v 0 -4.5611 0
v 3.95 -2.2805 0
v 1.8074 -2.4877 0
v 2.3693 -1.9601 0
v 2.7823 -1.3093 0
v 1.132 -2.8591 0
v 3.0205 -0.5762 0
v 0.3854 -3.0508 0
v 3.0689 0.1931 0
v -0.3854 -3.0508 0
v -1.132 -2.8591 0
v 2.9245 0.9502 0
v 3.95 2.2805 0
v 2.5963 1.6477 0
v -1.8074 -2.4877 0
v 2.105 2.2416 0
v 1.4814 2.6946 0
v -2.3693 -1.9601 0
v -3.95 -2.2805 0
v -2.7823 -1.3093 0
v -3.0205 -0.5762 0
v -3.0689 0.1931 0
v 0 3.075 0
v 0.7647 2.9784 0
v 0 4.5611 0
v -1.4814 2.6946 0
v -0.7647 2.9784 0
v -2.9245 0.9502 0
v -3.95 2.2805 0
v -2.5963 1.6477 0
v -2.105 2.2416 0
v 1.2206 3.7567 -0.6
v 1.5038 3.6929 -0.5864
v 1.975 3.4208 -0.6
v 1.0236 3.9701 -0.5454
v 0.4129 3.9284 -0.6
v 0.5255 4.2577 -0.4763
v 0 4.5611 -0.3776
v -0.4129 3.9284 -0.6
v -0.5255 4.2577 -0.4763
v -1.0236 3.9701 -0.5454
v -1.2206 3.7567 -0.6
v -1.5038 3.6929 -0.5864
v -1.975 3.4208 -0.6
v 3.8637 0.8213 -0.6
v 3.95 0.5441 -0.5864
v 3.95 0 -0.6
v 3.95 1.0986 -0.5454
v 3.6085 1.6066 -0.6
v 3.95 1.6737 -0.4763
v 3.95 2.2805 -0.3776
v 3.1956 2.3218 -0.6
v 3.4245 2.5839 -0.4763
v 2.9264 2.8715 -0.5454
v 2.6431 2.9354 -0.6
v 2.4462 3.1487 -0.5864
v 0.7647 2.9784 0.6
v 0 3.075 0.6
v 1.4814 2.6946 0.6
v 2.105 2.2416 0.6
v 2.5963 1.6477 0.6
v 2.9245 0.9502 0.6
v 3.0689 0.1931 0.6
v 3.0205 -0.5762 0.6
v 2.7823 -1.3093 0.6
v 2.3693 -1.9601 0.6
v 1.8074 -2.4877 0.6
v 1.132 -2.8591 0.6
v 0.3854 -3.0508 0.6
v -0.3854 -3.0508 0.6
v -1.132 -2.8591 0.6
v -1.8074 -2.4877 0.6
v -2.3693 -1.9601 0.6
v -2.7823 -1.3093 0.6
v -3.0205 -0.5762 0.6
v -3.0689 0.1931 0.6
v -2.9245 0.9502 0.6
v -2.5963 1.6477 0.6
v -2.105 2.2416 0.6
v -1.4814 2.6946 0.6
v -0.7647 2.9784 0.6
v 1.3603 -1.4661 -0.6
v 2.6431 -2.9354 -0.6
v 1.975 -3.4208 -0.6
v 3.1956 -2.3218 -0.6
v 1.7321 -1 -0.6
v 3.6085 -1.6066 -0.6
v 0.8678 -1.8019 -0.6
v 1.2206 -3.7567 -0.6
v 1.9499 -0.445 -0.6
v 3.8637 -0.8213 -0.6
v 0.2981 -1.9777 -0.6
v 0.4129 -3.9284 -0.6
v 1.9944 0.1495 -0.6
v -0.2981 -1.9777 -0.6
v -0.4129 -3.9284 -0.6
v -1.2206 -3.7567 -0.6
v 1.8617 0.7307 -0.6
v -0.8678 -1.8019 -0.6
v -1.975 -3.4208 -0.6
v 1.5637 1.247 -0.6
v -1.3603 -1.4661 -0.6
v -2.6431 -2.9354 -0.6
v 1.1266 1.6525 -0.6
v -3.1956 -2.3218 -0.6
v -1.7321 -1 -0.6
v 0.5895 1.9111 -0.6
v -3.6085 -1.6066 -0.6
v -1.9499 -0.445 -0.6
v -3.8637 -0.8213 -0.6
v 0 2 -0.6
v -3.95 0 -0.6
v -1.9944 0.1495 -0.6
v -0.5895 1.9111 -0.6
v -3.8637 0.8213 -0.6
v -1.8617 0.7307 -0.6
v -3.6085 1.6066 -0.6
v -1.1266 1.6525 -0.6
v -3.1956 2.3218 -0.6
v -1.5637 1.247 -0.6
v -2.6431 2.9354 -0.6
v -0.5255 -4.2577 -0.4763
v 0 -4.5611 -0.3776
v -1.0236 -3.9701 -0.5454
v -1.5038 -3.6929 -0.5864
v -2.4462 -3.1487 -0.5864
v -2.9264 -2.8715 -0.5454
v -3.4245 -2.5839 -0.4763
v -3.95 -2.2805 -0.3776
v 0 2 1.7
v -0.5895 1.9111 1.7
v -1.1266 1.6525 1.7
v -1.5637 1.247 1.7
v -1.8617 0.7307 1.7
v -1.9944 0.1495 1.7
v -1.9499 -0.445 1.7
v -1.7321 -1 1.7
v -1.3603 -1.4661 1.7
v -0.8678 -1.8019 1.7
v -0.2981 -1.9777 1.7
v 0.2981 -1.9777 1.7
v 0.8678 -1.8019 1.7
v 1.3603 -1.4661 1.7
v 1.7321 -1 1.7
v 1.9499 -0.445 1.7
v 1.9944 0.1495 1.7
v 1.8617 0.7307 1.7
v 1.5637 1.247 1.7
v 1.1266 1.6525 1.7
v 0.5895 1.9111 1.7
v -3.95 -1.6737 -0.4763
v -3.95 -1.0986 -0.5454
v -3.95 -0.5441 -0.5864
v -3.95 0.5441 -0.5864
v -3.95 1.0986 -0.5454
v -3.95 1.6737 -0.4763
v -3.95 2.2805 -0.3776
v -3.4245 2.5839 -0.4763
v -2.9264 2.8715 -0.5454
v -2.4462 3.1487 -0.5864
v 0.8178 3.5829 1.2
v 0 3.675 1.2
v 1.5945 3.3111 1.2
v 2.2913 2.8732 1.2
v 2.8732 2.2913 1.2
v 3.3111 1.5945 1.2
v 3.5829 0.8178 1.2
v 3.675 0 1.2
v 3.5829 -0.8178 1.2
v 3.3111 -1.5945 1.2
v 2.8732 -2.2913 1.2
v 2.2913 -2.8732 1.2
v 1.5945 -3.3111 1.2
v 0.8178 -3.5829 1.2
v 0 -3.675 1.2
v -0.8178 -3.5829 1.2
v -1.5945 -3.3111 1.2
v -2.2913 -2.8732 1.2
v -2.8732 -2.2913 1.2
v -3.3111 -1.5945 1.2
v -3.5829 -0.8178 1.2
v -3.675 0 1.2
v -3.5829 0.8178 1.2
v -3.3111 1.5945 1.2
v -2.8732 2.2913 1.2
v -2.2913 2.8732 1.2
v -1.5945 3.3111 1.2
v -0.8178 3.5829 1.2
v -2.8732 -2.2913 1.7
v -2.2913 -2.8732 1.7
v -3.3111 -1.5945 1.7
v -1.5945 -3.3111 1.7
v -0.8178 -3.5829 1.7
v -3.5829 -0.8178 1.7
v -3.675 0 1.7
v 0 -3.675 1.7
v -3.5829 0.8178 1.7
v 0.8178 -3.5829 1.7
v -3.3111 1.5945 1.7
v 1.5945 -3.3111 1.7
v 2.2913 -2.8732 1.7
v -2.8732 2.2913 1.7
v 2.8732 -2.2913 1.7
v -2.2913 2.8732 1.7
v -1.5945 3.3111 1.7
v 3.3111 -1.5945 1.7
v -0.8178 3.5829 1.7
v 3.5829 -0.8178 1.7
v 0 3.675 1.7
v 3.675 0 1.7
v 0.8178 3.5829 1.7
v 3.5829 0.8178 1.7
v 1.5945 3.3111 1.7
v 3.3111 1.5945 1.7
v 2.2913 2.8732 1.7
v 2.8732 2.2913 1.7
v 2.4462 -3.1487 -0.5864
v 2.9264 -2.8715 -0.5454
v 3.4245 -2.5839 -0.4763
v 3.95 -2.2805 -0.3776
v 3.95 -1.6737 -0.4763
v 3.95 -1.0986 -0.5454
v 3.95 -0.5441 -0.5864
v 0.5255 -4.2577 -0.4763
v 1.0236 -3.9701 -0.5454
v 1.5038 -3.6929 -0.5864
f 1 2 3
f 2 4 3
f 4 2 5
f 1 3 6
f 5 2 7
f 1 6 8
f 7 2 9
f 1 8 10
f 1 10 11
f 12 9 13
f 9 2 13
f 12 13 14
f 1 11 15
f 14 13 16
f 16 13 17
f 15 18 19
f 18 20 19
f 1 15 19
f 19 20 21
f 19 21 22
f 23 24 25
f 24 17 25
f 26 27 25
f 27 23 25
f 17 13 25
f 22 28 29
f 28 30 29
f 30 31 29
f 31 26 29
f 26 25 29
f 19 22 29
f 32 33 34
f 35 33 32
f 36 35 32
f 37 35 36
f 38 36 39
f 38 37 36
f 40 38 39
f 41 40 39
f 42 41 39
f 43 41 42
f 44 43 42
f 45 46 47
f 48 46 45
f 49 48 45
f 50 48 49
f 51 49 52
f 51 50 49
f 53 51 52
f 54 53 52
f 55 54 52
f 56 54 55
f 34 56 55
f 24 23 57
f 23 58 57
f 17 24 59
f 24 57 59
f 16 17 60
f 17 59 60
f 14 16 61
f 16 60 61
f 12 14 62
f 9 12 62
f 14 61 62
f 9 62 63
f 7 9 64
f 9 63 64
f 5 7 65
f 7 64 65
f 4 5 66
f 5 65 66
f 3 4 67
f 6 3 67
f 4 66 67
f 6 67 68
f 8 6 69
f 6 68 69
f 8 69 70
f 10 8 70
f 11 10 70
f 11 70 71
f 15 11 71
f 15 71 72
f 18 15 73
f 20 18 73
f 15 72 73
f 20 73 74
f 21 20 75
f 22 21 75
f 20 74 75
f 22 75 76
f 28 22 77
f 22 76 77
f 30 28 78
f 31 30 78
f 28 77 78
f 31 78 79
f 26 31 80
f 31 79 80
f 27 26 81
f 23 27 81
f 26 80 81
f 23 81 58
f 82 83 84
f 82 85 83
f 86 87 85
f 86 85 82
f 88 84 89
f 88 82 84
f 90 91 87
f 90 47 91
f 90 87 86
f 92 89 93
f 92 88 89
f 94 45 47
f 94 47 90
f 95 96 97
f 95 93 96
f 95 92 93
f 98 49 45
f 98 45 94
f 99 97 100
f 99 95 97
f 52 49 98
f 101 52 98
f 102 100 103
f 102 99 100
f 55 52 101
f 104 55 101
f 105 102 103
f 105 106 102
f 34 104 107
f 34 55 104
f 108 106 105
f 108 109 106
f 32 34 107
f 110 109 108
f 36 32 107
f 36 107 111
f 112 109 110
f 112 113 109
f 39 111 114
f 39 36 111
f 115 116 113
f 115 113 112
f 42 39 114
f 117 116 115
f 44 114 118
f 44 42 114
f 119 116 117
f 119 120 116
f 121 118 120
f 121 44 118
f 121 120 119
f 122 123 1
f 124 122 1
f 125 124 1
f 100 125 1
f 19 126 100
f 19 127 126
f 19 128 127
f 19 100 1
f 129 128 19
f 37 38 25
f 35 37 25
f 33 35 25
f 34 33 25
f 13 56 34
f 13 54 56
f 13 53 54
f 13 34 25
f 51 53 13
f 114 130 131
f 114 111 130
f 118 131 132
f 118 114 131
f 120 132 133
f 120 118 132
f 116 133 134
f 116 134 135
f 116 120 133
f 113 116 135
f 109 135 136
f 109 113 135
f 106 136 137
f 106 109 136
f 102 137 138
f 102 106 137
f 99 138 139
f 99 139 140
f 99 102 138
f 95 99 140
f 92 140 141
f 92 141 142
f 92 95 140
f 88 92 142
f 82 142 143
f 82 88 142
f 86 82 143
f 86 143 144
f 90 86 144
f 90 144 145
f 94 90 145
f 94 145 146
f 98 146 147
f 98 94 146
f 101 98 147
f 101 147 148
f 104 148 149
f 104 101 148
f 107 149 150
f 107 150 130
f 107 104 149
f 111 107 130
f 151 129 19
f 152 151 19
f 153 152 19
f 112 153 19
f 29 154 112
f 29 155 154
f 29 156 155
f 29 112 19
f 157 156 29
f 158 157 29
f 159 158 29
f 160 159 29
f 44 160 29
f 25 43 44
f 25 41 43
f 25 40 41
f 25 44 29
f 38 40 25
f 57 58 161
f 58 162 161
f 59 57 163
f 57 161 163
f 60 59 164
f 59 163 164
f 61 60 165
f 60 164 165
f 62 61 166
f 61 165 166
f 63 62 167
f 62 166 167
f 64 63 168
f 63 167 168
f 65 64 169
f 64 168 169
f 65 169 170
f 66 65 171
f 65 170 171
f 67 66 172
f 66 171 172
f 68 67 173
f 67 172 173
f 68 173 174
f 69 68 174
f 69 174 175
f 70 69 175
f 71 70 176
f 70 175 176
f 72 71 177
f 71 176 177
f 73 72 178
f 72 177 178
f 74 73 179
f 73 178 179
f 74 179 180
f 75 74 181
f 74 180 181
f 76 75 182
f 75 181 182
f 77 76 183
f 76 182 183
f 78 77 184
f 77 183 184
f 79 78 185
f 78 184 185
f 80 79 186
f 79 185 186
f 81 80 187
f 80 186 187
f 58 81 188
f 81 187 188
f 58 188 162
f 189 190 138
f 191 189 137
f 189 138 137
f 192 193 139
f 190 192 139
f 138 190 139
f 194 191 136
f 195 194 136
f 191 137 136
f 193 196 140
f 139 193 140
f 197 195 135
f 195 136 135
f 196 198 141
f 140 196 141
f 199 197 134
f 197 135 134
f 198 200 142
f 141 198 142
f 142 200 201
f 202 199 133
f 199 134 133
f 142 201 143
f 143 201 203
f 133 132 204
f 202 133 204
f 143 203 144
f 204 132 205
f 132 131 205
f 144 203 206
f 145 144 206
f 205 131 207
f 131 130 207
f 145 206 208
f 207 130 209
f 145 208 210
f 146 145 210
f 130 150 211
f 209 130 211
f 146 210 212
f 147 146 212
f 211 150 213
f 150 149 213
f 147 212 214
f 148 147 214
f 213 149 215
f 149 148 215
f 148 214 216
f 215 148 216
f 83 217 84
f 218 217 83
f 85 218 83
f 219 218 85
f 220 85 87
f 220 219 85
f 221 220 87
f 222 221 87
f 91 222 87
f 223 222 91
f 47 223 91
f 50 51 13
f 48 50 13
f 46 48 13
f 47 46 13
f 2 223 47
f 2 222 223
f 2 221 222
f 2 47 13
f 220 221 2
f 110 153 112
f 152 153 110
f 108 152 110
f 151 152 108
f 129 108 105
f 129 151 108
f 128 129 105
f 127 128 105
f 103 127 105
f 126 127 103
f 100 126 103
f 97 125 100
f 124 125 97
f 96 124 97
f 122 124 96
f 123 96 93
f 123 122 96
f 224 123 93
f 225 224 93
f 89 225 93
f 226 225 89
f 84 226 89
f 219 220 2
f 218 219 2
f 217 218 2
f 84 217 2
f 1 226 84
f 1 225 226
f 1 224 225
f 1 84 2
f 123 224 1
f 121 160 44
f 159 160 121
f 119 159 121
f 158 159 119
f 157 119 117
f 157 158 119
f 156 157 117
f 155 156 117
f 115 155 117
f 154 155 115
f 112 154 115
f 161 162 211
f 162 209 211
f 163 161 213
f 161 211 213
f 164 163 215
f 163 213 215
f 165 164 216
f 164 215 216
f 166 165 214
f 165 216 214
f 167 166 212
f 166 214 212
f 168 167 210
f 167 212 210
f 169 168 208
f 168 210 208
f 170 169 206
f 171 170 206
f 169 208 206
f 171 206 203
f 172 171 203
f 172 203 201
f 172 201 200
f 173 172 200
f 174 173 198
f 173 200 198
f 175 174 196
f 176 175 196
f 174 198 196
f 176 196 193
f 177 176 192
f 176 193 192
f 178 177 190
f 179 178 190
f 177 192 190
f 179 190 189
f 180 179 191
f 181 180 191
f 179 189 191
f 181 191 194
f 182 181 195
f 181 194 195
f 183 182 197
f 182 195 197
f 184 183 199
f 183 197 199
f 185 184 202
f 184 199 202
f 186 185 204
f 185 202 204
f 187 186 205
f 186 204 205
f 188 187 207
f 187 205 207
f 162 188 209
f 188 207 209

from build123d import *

# Parameters (mm, degrees)
BOSS_EXTRUDE1_DEPTH = 0.6
SKETCH6_W           = 2.3
SKETCH6_H           = 2


with BuildPart() as part:
    # Sketch1 → Revolve1 (revolve)
    with BuildSketch(Plane.ZY):
        Polygon((0, 3.075), (0.6, 3.075), (1.2, 3.675), (1.7, 3.675), (1.7, 0), (0, 0), (-0.6, 0), (-0.6, 3.95), (0, 3.95), align=None)
    revolve(axis=Axis((0, 0, 1.7), (0, 0, -1)))

    # Sketch3 → Boss-Extrude1 (add)
    with BuildSketch(Plane(origin=(0, 0, -0.6), x_dir=(-1, 0, 0), z_dir=(0, 0, -1))):
        Polygon((0, 4.561067127), (-3.95, 2.280533563), (-3.95, -2.280533563), (0, -4.561067127), (3.95, -2.280533563), (3.95, 2.280533563), align=None)
    extrude(amount=-BOSS_EXTRUDE1_DEPTH)

    # Sketch10 → Cut-Revolve4 (revolve, cut)
    with BuildSketch(Plane(origin=(0, 0, 0), x_dir=(0, 0, -1), z_dir=(1, 0, 0))):
        Polygon((0.377589755, 4.561067127), (0.6, 4.561067127), (0.6, 3.95), align=None)
    revolve(axis=Axis((0, 0, -0.6), (0, 0, 1)), mode=Mode.SUBTRACT)

    # Sketch6 → Cut-Revolve2 (revolve, cut)
    with BuildSketch(Plane(origin=(0, 0, 0), x_dir=(0, 0, -1), z_dir=(1, 0, 0))):
        with Locations((-0.55, 1)):
            Rectangle(SKETCH6_W, SKETCH6_H)
    revolve(axis=Axis((0, 0, -0.6), (0, 0, 1)), mode=Mode.SUBTRACT)


solid = part.part
